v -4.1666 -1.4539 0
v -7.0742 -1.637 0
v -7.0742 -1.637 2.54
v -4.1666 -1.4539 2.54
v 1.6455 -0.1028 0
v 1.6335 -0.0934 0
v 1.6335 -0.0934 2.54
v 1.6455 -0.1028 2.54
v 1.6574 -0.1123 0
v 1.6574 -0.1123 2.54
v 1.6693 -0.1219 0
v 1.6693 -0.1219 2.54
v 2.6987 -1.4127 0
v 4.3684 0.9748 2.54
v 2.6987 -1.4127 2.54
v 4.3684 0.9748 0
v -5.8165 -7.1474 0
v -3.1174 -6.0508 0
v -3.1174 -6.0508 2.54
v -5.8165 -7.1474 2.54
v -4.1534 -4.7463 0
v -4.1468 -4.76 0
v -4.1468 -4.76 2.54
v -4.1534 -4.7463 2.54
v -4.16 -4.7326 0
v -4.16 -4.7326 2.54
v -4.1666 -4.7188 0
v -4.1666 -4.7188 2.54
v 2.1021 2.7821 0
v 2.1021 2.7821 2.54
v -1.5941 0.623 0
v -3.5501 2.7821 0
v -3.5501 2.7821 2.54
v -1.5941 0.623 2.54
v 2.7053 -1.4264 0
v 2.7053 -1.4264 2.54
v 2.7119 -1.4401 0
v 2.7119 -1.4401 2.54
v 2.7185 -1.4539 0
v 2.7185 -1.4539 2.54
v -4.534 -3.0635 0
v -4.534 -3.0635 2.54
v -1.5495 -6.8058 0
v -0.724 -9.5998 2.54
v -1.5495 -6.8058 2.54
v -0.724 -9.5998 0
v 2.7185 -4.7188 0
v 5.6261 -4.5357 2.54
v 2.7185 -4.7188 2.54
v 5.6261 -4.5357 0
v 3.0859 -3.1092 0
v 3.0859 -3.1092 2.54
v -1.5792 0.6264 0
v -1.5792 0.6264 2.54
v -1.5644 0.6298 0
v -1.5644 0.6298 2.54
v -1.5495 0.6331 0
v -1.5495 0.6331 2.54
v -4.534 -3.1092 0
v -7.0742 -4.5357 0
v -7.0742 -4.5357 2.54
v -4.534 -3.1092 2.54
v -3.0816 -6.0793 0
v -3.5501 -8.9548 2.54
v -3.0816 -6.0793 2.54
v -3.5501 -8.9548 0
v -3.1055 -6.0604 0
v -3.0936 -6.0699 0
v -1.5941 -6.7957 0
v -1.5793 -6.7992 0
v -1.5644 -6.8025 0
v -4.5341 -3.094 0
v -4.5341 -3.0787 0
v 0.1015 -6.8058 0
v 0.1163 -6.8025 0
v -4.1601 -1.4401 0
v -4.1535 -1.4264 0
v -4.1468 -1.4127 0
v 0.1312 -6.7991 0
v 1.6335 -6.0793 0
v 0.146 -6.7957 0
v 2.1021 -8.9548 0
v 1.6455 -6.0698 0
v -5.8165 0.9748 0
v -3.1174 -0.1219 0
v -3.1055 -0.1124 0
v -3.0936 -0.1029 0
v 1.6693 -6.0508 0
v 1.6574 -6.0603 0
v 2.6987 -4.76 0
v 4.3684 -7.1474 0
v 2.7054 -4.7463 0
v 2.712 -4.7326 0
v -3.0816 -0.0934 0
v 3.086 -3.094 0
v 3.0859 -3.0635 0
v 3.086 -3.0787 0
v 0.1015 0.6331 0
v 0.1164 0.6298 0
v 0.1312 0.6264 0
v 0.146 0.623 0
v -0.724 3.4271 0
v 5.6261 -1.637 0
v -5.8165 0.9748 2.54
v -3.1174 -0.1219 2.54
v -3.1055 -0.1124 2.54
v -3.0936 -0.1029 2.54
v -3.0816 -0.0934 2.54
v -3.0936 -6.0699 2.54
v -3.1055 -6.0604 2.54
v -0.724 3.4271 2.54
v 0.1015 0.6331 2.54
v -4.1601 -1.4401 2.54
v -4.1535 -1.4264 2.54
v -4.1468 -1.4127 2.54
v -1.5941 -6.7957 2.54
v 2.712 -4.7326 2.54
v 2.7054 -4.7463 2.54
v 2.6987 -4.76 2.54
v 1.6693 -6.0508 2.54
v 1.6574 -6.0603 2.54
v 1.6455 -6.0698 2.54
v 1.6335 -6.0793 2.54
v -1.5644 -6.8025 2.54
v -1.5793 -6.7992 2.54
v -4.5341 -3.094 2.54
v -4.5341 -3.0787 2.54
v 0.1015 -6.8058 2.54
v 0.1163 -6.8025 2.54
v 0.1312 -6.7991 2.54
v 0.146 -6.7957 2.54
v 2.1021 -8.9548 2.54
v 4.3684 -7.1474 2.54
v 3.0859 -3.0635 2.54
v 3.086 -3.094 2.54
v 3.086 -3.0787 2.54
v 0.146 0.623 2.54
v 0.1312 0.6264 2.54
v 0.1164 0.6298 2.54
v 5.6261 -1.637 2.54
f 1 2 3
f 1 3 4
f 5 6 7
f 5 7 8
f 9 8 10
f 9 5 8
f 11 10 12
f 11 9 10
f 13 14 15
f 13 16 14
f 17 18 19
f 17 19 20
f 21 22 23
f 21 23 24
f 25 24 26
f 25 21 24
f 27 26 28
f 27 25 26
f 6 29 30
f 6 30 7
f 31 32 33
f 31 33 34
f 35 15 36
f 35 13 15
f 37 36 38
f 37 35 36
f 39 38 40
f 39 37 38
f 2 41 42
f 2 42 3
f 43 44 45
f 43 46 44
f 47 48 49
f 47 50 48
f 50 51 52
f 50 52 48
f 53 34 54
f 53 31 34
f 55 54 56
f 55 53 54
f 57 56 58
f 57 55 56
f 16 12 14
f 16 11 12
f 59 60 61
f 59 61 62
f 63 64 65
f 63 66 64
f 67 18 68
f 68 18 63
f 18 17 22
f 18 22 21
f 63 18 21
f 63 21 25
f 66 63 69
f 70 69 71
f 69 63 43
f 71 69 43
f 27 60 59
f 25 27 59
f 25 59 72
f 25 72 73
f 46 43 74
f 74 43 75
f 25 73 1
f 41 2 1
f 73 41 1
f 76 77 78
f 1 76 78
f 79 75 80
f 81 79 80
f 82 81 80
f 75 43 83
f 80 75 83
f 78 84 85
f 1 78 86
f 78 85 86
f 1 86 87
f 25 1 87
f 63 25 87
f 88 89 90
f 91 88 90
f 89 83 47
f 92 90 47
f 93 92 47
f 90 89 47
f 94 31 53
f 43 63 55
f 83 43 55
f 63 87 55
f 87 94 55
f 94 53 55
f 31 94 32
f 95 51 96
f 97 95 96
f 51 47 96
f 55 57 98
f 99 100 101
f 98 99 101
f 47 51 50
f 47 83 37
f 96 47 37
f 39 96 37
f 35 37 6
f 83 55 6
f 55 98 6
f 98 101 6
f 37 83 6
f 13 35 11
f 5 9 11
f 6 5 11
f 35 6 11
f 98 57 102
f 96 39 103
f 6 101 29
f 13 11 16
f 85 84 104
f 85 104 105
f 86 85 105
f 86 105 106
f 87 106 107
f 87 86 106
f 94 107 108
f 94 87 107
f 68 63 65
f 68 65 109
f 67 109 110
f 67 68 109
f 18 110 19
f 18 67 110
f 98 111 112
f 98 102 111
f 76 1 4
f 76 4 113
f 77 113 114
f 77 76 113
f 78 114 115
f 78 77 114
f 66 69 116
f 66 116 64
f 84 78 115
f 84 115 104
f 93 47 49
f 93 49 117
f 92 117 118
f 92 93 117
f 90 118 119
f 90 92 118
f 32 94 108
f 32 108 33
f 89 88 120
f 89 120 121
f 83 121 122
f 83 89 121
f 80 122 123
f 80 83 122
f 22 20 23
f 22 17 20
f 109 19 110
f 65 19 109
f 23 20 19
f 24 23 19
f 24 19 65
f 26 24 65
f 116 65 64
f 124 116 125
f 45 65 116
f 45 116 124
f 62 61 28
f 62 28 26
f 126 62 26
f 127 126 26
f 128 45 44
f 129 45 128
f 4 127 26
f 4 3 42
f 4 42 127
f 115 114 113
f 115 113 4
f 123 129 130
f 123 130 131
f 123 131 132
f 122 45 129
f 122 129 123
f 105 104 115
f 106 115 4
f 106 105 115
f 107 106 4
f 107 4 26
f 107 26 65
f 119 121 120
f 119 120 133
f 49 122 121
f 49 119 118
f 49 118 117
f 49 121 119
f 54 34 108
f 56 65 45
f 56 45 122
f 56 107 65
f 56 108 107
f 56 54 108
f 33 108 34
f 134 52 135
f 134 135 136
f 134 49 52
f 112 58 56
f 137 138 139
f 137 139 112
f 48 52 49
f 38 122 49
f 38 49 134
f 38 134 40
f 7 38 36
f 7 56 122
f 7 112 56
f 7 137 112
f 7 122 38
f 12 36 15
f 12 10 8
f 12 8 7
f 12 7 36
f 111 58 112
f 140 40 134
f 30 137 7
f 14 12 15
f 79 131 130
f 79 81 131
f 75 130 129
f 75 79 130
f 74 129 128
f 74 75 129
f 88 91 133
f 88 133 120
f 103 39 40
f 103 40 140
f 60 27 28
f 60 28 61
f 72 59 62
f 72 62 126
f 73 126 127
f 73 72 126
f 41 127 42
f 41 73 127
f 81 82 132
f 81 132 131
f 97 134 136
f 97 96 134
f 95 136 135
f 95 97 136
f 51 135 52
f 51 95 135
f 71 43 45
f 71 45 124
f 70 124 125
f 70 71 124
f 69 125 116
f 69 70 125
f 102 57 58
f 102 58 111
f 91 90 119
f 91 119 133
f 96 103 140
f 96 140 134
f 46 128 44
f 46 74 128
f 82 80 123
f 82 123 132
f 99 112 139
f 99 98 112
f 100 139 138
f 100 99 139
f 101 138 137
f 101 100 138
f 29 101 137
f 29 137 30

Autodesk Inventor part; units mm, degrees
ref_plane "YZ Plane" through (0, 0, 0) normal (1, 0, 0) x (0, 1, 0)
ref_plane "XZ Plane" through (0, 0, 0) normal (0, 1, 0) x (-1, 0, 0)
ref_plane "XY Plane" through (0, 0, 0) normal (0, 0, 1) x (1, 0, 0)
sketch "Sketch1" plane through (0, 0, 0) normal (0, 0, 1) x (1, 0, 0)
  line L0 (-1.5495, 0.6331) -> (-0.724, 3.4271)
  line L1 (-0.724, 3.4271) -> (0.1015, 0.6331)
  line L2 (0.1015, 0.6331) -> (-1.5495, 0.6331) construction
  line L3 (-0.724, 0.6331) -> (-0.724, 0.8628) construction
  line L4 (-3.0816, -0.0934) -> (-3.5501, 2.7821)
  line L5 (-3.5501, 2.7821) -> (-1.5941, 0.623)
  line L6 (-4.1468, -1.4127) -> (-5.8165, 0.9748)
  line L7 (-5.8165, 0.9748) -> (-3.1174, -0.1219)
  line L8 (-4.534, -3.0635) -> (-7.0742, -1.637)
  line L9 (-7.0742, -1.637) -> (-4.1666, -1.4539)
  line L10 (-4.1666, -4.7188) -> (-7.0742, -4.5357)
  line L11 (-7.0742, -4.5357) -> (-4.534, -3.1092)
  line L12 (-3.1174, -6.0508) -> (-5.8165, -7.1474)
  line L13 (-5.8165, -7.1474) -> (-4.1468, -4.76)
  line L14 (-1.5941, -6.7957) -> (-3.5501, -8.9548)
  line L15 (-3.5501, -8.9548) -> (-3.0816, -6.0793)
  line L16 (0.1015, -6.8058) -> (-0.724, -9.5998)
  line L17 (-0.724, -9.5998) -> (-1.5495, -6.8058)
  line L18 (1.6335, -6.0793) -> (2.1021, -8.9548)
  line L19 (2.1021, -8.9548) -> (0.146, -6.7957)
  line L20 (2.6987, -4.76) -> (4.3684, -7.1474)
  line L21 (4.3684, -7.1474) -> (1.6693, -6.0508)
  line L22 (3.0859, -3.1092) -> (5.6261, -4.5357)
  line L23 (5.6261, -4.5357) -> (2.7185, -4.7188)
  line L24 (2.7185, -1.4539) -> (5.6261, -1.637)
  line L25 (5.6261, -1.637) -> (3.0859, -3.0635)
  line L26 (1.6693, -0.1219) -> (4.3684, 0.9748)
  line L27 (4.3684, 0.9748) -> (2.6987, -1.4127)
  line L28 (0.146, 0.623) -> (2.1021, 2.7821)
  line L29 (2.1021, 2.7821) -> (1.6335, -0.0934)
  arc A0 (-1.5495, 0.6331) -> (-1.5941, 0.623) centre (-0.724, -3.0863) ccw
  arc A1 (-3.0816, -0.0934) -> (-3.1174, -0.1219) centre (-0.724, -3.0863) ccw
  arc A2 (-4.1468, -1.4127) -> (-4.1666, -1.4539) centre (-0.724, -3.0863) ccw
  arc A3 (-4.534, -3.0635) -> (-4.534, -3.1092) centre (-0.724, -3.0863) ccw
  arc A4 (-4.1666, -4.7188) -> (-4.1468, -4.76) centre (-0.724, -3.0863) ccw
  arc A5 (-3.1174, -6.0508) -> (-3.0816, -6.0793) centre (-0.724, -3.0863) ccw
  arc A6 (-1.5941, -6.7957) -> (-1.5495, -6.8058) centre (-0.724, -3.0863) ccw
  arc A7 (0.1015, -6.8058) -> (0.146, -6.7957) centre (-0.724, -3.0863) ccw
  arc A8 (1.6335, -6.0793) -> (1.6693, -6.0508) centre (-0.724, -3.0863) ccw
  arc A9 (2.6987, -4.76) -> (2.7185, -4.7188) centre (-0.724, -3.0863) ccw
  arc A10 (3.0859, -3.1092) -> (3.0859, -3.0635) centre (-0.724, -3.0863) ccw
  arc A11 (2.7185, -1.4539) -> (2.6987, -1.4127) centre (-0.724, -3.0863) ccw
  arc A12 (1.6693, -0.1219) -> (1.6335, -0.0934) centre (-0.724, -3.0863) ccw
  arc A13 (0.146, 0.623) -> (0.1015, 0.6331) centre (-0.724, -3.0863) ccw
  point P0 (0, 0)
  dimension "d0" = 1.651
  dimension "d1" = 2.794
extrude "Extrusion1" add sketch "Sketch1" along normal blind 2.54
properties part number "Small Gear Phone Case Mech"
